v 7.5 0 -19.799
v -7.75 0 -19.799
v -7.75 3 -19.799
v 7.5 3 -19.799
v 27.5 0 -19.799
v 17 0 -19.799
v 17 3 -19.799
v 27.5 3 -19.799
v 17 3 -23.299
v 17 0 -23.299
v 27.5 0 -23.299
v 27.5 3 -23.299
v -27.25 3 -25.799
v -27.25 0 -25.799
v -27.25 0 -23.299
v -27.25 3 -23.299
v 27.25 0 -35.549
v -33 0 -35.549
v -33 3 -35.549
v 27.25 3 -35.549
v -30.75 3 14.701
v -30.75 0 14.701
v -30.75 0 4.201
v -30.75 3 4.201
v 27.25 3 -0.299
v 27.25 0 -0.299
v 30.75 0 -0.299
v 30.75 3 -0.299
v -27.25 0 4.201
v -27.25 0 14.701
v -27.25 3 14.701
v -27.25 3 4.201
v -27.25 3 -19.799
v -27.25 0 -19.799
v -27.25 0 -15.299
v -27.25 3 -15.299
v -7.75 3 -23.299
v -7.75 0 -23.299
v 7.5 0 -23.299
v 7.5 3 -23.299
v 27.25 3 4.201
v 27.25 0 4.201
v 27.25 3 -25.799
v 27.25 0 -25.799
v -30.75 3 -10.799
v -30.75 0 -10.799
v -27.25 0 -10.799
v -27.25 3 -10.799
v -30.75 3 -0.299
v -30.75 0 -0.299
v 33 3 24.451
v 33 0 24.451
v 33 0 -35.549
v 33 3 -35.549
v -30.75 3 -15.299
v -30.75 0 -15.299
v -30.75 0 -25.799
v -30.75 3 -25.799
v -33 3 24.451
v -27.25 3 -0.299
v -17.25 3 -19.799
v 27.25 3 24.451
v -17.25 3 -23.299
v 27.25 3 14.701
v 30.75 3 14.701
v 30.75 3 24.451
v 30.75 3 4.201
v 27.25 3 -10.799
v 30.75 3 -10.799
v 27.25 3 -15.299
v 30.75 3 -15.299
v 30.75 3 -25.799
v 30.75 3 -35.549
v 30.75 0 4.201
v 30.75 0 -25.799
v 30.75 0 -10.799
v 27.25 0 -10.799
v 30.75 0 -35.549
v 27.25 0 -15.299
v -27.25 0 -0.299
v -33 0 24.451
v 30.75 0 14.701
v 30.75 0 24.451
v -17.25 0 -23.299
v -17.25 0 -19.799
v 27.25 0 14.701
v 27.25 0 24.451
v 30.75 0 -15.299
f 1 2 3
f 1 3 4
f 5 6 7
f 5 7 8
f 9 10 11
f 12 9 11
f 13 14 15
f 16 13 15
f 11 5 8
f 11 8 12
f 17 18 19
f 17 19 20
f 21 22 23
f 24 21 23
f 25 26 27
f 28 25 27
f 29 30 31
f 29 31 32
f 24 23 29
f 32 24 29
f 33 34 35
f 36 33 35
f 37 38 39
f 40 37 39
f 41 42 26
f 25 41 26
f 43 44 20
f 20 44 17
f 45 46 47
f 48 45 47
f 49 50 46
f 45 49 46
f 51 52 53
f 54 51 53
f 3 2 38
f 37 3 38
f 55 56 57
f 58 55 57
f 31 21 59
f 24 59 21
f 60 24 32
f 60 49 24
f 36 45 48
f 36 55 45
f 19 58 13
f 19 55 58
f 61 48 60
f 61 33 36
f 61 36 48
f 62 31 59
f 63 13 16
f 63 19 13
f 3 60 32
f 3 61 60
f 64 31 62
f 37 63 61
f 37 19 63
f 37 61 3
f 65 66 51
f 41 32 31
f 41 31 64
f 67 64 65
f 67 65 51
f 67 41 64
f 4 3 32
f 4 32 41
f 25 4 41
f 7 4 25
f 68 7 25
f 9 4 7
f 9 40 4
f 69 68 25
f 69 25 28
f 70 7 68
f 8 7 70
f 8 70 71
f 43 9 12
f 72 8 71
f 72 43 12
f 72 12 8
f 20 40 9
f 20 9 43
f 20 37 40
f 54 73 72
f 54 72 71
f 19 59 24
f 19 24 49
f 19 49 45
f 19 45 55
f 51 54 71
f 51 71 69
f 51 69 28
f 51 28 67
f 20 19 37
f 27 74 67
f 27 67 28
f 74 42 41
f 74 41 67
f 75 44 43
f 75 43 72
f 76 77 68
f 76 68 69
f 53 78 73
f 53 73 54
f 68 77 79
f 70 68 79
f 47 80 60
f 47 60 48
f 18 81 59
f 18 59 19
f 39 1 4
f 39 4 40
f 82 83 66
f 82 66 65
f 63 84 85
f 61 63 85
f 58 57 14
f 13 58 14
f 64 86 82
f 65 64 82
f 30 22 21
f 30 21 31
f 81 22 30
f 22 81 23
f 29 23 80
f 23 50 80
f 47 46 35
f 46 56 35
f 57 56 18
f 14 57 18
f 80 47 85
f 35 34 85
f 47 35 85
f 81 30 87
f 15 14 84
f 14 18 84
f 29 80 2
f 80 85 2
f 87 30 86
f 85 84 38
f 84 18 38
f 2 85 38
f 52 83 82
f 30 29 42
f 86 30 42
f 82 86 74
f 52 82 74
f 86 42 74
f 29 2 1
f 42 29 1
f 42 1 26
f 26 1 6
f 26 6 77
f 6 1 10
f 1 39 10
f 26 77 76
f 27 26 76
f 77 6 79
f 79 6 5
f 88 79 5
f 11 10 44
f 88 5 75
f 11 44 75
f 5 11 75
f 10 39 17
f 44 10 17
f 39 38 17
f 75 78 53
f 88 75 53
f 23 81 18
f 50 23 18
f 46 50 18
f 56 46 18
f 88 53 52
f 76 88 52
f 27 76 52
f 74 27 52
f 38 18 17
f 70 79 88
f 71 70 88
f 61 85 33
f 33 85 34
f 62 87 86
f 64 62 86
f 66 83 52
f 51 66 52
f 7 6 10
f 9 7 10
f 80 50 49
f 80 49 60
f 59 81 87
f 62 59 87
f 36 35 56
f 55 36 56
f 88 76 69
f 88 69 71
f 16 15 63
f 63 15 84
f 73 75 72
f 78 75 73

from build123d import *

# Parameters (mm, degrees)
SKETCH_3_W          = 66
SKETCH_3_H          = 60
EXTRUDE_1_DEPTH     = 3
SKETCH_1_W          = 3.5
SKETCH_1_H          = 10.5
SKETCH_1_H_2        = 9.75
SKETCH_1_H_3        = 4.5
SKETCH_1_W_2        = 15.25
SKETCH_1_H_4        = 3.5
SKETCH_1_W_3        = 10.5
CUT_EXTRUDE_1_DEPTH = 49.597691494


with BuildPart() as part:
    # Эскиз3 → Бобышка-Вытянуть1 (new body)
    with BuildSketch(Plane(origin=(0, 0, 0), x_dir=(1, 0, 0), z_dir=(0, 1, 0))):
        with Locations((0, 5.54905932)):
            Rectangle(SKETCH_3_W, SKETCH_3_H)
    extrude(amount=EXTRUDE_1_DEPTH)

    # Эскиз1 → Вырез-Вытянуть1 (cut, through all)
    with BuildSketch(Plane(origin=(0, 0, 0), x_dir=(1, 0, 0), z_dir=(0, 1, 0))):
        with Locations((-29, 5.54905932)):
            Rectangle(SKETCH_1_W, SKETCH_1_H)
        Polygon((-30.75, 25.79905932), (-27.25, 25.79905932), (-27.25, 23.29905932), (-17.25, 23.29905932), (-17.25, 19.79905932), (-27.25, 19.79905932), (-27.25, 15.29905932), (-30.75, 15.29905932), align=None)
        with Locations((-29, -9.45094068)):
            Rectangle(SKETCH_1_W, SKETCH_1_H)
        with Locations((29, -19.57594068)):
            Rectangle(SKETCH_1_W, SKETCH_1_H_2)
        with Locations((29, 13.04905932)):
            Rectangle(SKETCH_1_W, SKETCH_1_H_3)
        with Locations((29, -1.95094068)):
            Rectangle(SKETCH_1_W, SKETCH_1_H_3)
        with Locations((29, 30.67405932)):
            Rectangle(SKETCH_1_W, SKETCH_1_H_2)
        with Locations((-0.125, 21.54905932)):
            Rectangle(SKETCH_1_W_2, SKETCH_1_H_4)
        with Locations((22.25, 21.54905932)):
            Rectangle(SKETCH_1_W_3, SKETCH_1_H_4)
    extrude(amount=CUT_EXTRUDE_1_DEPTH, mode=Mode.SUBTRACT)


solid = part.part
